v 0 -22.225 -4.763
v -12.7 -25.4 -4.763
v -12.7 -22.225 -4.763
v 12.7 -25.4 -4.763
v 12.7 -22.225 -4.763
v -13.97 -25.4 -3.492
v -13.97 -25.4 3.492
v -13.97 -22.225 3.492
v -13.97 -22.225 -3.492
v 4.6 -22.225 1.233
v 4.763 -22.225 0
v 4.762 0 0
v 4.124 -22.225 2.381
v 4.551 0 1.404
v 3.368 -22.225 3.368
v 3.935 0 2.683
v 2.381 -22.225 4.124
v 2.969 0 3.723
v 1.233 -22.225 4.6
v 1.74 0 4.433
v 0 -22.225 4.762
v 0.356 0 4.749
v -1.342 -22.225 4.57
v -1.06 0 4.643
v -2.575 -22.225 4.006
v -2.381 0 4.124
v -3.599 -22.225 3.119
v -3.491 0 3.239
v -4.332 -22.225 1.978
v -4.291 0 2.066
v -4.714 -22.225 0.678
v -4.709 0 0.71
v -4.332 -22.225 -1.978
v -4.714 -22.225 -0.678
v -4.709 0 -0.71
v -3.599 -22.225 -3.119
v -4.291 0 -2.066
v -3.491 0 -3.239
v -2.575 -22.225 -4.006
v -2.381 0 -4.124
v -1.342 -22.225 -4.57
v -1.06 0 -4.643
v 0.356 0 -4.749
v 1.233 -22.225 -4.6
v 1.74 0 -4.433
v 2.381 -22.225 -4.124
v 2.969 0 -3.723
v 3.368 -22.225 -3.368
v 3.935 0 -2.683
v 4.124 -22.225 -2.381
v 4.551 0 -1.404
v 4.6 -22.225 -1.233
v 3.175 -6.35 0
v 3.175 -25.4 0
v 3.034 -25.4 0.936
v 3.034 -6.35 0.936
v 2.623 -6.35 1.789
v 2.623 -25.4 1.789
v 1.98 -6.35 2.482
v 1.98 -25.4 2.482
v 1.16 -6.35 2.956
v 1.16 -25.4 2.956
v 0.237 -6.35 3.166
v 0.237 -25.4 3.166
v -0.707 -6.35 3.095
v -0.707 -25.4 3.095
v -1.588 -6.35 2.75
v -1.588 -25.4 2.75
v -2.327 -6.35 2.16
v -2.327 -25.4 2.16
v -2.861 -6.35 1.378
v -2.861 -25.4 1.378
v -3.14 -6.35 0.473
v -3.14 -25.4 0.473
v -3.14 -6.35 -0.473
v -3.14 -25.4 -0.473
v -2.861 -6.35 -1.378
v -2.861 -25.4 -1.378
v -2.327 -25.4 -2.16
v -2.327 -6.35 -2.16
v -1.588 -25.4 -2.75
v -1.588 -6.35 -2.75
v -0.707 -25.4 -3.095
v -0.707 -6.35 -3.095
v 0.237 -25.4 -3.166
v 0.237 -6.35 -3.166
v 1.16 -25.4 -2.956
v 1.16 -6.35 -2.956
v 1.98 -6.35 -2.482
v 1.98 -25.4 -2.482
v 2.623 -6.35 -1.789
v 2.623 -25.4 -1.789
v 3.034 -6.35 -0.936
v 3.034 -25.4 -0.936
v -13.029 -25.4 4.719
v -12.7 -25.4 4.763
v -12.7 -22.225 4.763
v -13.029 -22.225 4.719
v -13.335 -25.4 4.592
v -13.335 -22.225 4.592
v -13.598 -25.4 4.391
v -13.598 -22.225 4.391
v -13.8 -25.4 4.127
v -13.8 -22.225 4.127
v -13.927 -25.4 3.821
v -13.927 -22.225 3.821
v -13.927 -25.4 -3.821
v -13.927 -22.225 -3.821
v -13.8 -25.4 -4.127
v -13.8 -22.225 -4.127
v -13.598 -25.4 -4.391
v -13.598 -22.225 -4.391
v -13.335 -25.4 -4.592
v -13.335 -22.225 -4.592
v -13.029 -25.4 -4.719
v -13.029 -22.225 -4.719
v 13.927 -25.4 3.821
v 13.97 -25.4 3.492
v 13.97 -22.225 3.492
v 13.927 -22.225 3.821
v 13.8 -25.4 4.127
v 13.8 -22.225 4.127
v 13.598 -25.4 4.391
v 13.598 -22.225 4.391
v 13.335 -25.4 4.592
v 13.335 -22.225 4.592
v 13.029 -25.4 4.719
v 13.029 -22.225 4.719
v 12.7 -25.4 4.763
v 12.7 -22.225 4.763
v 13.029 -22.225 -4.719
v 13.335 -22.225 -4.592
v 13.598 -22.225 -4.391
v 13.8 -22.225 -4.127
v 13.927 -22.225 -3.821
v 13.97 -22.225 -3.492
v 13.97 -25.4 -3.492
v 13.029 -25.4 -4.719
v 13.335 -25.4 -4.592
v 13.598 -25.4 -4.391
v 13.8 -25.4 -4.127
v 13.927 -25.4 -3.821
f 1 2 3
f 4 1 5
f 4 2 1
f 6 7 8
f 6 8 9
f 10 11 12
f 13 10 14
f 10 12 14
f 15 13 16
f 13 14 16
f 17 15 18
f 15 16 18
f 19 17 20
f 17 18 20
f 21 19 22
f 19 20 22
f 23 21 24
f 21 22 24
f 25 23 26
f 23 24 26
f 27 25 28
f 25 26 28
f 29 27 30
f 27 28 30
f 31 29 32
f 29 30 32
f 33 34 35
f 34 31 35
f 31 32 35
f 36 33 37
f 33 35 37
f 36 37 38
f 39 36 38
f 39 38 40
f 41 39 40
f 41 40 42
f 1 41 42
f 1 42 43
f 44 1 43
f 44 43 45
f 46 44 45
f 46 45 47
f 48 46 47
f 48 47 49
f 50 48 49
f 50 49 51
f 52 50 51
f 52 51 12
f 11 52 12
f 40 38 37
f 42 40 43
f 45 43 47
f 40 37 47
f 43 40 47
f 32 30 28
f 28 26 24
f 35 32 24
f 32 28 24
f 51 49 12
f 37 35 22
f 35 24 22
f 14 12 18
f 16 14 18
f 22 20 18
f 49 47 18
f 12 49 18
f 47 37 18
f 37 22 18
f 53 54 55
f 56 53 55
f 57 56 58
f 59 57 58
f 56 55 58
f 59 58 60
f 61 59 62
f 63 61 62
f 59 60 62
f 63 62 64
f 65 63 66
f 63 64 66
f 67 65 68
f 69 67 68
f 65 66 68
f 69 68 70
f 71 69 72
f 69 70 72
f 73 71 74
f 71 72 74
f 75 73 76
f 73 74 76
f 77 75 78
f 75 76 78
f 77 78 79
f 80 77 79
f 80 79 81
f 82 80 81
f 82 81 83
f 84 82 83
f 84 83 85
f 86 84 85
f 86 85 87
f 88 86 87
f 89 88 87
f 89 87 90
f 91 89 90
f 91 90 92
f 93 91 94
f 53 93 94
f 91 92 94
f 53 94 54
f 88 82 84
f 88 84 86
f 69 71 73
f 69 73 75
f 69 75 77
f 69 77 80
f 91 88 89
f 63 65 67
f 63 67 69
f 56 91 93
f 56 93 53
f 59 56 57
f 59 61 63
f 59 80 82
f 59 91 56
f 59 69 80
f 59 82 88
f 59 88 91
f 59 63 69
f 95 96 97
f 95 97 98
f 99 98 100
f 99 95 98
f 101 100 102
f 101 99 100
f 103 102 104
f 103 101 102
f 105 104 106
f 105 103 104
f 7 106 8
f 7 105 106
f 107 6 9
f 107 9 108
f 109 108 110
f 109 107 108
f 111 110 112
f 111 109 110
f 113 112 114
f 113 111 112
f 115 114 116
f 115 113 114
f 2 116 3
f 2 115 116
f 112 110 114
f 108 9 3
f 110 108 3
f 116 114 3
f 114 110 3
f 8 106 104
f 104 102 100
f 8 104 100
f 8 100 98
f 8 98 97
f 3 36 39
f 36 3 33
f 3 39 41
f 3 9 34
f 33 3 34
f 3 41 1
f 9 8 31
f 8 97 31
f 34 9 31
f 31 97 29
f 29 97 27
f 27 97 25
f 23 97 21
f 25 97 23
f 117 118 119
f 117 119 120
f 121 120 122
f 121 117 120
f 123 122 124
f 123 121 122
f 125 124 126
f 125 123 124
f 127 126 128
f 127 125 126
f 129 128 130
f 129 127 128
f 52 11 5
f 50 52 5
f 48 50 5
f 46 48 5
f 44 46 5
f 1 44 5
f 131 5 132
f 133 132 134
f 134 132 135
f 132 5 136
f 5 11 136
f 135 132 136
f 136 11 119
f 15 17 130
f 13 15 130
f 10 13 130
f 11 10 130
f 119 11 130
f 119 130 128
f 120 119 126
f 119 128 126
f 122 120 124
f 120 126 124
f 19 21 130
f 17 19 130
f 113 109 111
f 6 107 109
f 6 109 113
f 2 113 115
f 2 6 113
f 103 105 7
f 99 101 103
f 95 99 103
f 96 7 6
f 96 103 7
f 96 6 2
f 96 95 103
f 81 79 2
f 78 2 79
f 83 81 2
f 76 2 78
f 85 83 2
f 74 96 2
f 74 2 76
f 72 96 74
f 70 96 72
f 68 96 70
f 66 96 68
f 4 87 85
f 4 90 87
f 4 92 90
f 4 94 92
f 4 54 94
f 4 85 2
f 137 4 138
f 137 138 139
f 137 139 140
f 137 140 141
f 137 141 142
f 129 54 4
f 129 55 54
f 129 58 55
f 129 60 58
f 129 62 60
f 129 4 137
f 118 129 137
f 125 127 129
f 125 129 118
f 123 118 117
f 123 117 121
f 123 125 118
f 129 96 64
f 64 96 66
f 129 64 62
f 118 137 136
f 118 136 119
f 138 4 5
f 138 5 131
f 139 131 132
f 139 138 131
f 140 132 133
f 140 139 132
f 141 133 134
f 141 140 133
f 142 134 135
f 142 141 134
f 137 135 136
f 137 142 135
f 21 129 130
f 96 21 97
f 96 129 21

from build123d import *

# Parameters (mm, degrees)
F0_R     = 4.7625
F1_DEPTH = 25.4
F2_R     = 3.175
F3_DEPTH = 19.05
F5_DEPTH = 3.175


with BuildPart() as f1:
    # F0 (on Front) → F1 (new body)
    with BuildSketch(Plane.XZ):
        Circle(F0_R)
    extrude(amount=F1_DEPTH)

    # F2 (on face) → F3 (cut)
    with BuildSketch(Plane.XZ.offset(25.4)):
        Circle(F2_R)
    extrude(amount=-F3_DEPTH, mode=Mode.SUBTRACT)

    # F4 (on face) → F5 (join)
    with BuildSketch(Plane.XZ.offset(25.4)):
        with BuildLine():
            ThreePointArc((0, -4.7625), (-4.7625, 0), (0, 4.7625))
            Line((0, 4.7625), (-12.7, 4.7625))
            ThreePointArc((-12.7, 4.7625), (-13.5980256121, 4.3905256121), (-13.97, 3.4925))
            Line((-13.97, 3.4925), (-13.97, -3.4925))
            ThreePointArc((-13.97, -3.4925), (-13.5980256121, -4.3905256121), (-12.7, -4.7625))
            Line((-12.7, -4.7625), (0, -4.7625))
        make_face()
        with BuildLine():
            Line((12.7, 4.7625), (0, 4.7625))
            ThreePointArc((0, 4.7625), (3.3675960454, 3.3675960454), (4.7625, 0))
            ThreePointArc((4.7625, 0), (3.3675960454, -3.3675960454), (0, -4.7625))
            Line((0, -4.7625), (12.7, -4.7625))
            ThreePointArc((12.7, -4.7625), (13.5980256121, -4.3905256121), (13.97, -3.4925))
            Line((13.97, -3.4925), (13.97, 3.4925))
            ThreePointArc((13.97, 3.4925), (13.5980256121, 4.3905256121), (12.7, 4.7625))
        make_face()
    extrude(amount=-F5_DEPTH)


solid = f1.part
